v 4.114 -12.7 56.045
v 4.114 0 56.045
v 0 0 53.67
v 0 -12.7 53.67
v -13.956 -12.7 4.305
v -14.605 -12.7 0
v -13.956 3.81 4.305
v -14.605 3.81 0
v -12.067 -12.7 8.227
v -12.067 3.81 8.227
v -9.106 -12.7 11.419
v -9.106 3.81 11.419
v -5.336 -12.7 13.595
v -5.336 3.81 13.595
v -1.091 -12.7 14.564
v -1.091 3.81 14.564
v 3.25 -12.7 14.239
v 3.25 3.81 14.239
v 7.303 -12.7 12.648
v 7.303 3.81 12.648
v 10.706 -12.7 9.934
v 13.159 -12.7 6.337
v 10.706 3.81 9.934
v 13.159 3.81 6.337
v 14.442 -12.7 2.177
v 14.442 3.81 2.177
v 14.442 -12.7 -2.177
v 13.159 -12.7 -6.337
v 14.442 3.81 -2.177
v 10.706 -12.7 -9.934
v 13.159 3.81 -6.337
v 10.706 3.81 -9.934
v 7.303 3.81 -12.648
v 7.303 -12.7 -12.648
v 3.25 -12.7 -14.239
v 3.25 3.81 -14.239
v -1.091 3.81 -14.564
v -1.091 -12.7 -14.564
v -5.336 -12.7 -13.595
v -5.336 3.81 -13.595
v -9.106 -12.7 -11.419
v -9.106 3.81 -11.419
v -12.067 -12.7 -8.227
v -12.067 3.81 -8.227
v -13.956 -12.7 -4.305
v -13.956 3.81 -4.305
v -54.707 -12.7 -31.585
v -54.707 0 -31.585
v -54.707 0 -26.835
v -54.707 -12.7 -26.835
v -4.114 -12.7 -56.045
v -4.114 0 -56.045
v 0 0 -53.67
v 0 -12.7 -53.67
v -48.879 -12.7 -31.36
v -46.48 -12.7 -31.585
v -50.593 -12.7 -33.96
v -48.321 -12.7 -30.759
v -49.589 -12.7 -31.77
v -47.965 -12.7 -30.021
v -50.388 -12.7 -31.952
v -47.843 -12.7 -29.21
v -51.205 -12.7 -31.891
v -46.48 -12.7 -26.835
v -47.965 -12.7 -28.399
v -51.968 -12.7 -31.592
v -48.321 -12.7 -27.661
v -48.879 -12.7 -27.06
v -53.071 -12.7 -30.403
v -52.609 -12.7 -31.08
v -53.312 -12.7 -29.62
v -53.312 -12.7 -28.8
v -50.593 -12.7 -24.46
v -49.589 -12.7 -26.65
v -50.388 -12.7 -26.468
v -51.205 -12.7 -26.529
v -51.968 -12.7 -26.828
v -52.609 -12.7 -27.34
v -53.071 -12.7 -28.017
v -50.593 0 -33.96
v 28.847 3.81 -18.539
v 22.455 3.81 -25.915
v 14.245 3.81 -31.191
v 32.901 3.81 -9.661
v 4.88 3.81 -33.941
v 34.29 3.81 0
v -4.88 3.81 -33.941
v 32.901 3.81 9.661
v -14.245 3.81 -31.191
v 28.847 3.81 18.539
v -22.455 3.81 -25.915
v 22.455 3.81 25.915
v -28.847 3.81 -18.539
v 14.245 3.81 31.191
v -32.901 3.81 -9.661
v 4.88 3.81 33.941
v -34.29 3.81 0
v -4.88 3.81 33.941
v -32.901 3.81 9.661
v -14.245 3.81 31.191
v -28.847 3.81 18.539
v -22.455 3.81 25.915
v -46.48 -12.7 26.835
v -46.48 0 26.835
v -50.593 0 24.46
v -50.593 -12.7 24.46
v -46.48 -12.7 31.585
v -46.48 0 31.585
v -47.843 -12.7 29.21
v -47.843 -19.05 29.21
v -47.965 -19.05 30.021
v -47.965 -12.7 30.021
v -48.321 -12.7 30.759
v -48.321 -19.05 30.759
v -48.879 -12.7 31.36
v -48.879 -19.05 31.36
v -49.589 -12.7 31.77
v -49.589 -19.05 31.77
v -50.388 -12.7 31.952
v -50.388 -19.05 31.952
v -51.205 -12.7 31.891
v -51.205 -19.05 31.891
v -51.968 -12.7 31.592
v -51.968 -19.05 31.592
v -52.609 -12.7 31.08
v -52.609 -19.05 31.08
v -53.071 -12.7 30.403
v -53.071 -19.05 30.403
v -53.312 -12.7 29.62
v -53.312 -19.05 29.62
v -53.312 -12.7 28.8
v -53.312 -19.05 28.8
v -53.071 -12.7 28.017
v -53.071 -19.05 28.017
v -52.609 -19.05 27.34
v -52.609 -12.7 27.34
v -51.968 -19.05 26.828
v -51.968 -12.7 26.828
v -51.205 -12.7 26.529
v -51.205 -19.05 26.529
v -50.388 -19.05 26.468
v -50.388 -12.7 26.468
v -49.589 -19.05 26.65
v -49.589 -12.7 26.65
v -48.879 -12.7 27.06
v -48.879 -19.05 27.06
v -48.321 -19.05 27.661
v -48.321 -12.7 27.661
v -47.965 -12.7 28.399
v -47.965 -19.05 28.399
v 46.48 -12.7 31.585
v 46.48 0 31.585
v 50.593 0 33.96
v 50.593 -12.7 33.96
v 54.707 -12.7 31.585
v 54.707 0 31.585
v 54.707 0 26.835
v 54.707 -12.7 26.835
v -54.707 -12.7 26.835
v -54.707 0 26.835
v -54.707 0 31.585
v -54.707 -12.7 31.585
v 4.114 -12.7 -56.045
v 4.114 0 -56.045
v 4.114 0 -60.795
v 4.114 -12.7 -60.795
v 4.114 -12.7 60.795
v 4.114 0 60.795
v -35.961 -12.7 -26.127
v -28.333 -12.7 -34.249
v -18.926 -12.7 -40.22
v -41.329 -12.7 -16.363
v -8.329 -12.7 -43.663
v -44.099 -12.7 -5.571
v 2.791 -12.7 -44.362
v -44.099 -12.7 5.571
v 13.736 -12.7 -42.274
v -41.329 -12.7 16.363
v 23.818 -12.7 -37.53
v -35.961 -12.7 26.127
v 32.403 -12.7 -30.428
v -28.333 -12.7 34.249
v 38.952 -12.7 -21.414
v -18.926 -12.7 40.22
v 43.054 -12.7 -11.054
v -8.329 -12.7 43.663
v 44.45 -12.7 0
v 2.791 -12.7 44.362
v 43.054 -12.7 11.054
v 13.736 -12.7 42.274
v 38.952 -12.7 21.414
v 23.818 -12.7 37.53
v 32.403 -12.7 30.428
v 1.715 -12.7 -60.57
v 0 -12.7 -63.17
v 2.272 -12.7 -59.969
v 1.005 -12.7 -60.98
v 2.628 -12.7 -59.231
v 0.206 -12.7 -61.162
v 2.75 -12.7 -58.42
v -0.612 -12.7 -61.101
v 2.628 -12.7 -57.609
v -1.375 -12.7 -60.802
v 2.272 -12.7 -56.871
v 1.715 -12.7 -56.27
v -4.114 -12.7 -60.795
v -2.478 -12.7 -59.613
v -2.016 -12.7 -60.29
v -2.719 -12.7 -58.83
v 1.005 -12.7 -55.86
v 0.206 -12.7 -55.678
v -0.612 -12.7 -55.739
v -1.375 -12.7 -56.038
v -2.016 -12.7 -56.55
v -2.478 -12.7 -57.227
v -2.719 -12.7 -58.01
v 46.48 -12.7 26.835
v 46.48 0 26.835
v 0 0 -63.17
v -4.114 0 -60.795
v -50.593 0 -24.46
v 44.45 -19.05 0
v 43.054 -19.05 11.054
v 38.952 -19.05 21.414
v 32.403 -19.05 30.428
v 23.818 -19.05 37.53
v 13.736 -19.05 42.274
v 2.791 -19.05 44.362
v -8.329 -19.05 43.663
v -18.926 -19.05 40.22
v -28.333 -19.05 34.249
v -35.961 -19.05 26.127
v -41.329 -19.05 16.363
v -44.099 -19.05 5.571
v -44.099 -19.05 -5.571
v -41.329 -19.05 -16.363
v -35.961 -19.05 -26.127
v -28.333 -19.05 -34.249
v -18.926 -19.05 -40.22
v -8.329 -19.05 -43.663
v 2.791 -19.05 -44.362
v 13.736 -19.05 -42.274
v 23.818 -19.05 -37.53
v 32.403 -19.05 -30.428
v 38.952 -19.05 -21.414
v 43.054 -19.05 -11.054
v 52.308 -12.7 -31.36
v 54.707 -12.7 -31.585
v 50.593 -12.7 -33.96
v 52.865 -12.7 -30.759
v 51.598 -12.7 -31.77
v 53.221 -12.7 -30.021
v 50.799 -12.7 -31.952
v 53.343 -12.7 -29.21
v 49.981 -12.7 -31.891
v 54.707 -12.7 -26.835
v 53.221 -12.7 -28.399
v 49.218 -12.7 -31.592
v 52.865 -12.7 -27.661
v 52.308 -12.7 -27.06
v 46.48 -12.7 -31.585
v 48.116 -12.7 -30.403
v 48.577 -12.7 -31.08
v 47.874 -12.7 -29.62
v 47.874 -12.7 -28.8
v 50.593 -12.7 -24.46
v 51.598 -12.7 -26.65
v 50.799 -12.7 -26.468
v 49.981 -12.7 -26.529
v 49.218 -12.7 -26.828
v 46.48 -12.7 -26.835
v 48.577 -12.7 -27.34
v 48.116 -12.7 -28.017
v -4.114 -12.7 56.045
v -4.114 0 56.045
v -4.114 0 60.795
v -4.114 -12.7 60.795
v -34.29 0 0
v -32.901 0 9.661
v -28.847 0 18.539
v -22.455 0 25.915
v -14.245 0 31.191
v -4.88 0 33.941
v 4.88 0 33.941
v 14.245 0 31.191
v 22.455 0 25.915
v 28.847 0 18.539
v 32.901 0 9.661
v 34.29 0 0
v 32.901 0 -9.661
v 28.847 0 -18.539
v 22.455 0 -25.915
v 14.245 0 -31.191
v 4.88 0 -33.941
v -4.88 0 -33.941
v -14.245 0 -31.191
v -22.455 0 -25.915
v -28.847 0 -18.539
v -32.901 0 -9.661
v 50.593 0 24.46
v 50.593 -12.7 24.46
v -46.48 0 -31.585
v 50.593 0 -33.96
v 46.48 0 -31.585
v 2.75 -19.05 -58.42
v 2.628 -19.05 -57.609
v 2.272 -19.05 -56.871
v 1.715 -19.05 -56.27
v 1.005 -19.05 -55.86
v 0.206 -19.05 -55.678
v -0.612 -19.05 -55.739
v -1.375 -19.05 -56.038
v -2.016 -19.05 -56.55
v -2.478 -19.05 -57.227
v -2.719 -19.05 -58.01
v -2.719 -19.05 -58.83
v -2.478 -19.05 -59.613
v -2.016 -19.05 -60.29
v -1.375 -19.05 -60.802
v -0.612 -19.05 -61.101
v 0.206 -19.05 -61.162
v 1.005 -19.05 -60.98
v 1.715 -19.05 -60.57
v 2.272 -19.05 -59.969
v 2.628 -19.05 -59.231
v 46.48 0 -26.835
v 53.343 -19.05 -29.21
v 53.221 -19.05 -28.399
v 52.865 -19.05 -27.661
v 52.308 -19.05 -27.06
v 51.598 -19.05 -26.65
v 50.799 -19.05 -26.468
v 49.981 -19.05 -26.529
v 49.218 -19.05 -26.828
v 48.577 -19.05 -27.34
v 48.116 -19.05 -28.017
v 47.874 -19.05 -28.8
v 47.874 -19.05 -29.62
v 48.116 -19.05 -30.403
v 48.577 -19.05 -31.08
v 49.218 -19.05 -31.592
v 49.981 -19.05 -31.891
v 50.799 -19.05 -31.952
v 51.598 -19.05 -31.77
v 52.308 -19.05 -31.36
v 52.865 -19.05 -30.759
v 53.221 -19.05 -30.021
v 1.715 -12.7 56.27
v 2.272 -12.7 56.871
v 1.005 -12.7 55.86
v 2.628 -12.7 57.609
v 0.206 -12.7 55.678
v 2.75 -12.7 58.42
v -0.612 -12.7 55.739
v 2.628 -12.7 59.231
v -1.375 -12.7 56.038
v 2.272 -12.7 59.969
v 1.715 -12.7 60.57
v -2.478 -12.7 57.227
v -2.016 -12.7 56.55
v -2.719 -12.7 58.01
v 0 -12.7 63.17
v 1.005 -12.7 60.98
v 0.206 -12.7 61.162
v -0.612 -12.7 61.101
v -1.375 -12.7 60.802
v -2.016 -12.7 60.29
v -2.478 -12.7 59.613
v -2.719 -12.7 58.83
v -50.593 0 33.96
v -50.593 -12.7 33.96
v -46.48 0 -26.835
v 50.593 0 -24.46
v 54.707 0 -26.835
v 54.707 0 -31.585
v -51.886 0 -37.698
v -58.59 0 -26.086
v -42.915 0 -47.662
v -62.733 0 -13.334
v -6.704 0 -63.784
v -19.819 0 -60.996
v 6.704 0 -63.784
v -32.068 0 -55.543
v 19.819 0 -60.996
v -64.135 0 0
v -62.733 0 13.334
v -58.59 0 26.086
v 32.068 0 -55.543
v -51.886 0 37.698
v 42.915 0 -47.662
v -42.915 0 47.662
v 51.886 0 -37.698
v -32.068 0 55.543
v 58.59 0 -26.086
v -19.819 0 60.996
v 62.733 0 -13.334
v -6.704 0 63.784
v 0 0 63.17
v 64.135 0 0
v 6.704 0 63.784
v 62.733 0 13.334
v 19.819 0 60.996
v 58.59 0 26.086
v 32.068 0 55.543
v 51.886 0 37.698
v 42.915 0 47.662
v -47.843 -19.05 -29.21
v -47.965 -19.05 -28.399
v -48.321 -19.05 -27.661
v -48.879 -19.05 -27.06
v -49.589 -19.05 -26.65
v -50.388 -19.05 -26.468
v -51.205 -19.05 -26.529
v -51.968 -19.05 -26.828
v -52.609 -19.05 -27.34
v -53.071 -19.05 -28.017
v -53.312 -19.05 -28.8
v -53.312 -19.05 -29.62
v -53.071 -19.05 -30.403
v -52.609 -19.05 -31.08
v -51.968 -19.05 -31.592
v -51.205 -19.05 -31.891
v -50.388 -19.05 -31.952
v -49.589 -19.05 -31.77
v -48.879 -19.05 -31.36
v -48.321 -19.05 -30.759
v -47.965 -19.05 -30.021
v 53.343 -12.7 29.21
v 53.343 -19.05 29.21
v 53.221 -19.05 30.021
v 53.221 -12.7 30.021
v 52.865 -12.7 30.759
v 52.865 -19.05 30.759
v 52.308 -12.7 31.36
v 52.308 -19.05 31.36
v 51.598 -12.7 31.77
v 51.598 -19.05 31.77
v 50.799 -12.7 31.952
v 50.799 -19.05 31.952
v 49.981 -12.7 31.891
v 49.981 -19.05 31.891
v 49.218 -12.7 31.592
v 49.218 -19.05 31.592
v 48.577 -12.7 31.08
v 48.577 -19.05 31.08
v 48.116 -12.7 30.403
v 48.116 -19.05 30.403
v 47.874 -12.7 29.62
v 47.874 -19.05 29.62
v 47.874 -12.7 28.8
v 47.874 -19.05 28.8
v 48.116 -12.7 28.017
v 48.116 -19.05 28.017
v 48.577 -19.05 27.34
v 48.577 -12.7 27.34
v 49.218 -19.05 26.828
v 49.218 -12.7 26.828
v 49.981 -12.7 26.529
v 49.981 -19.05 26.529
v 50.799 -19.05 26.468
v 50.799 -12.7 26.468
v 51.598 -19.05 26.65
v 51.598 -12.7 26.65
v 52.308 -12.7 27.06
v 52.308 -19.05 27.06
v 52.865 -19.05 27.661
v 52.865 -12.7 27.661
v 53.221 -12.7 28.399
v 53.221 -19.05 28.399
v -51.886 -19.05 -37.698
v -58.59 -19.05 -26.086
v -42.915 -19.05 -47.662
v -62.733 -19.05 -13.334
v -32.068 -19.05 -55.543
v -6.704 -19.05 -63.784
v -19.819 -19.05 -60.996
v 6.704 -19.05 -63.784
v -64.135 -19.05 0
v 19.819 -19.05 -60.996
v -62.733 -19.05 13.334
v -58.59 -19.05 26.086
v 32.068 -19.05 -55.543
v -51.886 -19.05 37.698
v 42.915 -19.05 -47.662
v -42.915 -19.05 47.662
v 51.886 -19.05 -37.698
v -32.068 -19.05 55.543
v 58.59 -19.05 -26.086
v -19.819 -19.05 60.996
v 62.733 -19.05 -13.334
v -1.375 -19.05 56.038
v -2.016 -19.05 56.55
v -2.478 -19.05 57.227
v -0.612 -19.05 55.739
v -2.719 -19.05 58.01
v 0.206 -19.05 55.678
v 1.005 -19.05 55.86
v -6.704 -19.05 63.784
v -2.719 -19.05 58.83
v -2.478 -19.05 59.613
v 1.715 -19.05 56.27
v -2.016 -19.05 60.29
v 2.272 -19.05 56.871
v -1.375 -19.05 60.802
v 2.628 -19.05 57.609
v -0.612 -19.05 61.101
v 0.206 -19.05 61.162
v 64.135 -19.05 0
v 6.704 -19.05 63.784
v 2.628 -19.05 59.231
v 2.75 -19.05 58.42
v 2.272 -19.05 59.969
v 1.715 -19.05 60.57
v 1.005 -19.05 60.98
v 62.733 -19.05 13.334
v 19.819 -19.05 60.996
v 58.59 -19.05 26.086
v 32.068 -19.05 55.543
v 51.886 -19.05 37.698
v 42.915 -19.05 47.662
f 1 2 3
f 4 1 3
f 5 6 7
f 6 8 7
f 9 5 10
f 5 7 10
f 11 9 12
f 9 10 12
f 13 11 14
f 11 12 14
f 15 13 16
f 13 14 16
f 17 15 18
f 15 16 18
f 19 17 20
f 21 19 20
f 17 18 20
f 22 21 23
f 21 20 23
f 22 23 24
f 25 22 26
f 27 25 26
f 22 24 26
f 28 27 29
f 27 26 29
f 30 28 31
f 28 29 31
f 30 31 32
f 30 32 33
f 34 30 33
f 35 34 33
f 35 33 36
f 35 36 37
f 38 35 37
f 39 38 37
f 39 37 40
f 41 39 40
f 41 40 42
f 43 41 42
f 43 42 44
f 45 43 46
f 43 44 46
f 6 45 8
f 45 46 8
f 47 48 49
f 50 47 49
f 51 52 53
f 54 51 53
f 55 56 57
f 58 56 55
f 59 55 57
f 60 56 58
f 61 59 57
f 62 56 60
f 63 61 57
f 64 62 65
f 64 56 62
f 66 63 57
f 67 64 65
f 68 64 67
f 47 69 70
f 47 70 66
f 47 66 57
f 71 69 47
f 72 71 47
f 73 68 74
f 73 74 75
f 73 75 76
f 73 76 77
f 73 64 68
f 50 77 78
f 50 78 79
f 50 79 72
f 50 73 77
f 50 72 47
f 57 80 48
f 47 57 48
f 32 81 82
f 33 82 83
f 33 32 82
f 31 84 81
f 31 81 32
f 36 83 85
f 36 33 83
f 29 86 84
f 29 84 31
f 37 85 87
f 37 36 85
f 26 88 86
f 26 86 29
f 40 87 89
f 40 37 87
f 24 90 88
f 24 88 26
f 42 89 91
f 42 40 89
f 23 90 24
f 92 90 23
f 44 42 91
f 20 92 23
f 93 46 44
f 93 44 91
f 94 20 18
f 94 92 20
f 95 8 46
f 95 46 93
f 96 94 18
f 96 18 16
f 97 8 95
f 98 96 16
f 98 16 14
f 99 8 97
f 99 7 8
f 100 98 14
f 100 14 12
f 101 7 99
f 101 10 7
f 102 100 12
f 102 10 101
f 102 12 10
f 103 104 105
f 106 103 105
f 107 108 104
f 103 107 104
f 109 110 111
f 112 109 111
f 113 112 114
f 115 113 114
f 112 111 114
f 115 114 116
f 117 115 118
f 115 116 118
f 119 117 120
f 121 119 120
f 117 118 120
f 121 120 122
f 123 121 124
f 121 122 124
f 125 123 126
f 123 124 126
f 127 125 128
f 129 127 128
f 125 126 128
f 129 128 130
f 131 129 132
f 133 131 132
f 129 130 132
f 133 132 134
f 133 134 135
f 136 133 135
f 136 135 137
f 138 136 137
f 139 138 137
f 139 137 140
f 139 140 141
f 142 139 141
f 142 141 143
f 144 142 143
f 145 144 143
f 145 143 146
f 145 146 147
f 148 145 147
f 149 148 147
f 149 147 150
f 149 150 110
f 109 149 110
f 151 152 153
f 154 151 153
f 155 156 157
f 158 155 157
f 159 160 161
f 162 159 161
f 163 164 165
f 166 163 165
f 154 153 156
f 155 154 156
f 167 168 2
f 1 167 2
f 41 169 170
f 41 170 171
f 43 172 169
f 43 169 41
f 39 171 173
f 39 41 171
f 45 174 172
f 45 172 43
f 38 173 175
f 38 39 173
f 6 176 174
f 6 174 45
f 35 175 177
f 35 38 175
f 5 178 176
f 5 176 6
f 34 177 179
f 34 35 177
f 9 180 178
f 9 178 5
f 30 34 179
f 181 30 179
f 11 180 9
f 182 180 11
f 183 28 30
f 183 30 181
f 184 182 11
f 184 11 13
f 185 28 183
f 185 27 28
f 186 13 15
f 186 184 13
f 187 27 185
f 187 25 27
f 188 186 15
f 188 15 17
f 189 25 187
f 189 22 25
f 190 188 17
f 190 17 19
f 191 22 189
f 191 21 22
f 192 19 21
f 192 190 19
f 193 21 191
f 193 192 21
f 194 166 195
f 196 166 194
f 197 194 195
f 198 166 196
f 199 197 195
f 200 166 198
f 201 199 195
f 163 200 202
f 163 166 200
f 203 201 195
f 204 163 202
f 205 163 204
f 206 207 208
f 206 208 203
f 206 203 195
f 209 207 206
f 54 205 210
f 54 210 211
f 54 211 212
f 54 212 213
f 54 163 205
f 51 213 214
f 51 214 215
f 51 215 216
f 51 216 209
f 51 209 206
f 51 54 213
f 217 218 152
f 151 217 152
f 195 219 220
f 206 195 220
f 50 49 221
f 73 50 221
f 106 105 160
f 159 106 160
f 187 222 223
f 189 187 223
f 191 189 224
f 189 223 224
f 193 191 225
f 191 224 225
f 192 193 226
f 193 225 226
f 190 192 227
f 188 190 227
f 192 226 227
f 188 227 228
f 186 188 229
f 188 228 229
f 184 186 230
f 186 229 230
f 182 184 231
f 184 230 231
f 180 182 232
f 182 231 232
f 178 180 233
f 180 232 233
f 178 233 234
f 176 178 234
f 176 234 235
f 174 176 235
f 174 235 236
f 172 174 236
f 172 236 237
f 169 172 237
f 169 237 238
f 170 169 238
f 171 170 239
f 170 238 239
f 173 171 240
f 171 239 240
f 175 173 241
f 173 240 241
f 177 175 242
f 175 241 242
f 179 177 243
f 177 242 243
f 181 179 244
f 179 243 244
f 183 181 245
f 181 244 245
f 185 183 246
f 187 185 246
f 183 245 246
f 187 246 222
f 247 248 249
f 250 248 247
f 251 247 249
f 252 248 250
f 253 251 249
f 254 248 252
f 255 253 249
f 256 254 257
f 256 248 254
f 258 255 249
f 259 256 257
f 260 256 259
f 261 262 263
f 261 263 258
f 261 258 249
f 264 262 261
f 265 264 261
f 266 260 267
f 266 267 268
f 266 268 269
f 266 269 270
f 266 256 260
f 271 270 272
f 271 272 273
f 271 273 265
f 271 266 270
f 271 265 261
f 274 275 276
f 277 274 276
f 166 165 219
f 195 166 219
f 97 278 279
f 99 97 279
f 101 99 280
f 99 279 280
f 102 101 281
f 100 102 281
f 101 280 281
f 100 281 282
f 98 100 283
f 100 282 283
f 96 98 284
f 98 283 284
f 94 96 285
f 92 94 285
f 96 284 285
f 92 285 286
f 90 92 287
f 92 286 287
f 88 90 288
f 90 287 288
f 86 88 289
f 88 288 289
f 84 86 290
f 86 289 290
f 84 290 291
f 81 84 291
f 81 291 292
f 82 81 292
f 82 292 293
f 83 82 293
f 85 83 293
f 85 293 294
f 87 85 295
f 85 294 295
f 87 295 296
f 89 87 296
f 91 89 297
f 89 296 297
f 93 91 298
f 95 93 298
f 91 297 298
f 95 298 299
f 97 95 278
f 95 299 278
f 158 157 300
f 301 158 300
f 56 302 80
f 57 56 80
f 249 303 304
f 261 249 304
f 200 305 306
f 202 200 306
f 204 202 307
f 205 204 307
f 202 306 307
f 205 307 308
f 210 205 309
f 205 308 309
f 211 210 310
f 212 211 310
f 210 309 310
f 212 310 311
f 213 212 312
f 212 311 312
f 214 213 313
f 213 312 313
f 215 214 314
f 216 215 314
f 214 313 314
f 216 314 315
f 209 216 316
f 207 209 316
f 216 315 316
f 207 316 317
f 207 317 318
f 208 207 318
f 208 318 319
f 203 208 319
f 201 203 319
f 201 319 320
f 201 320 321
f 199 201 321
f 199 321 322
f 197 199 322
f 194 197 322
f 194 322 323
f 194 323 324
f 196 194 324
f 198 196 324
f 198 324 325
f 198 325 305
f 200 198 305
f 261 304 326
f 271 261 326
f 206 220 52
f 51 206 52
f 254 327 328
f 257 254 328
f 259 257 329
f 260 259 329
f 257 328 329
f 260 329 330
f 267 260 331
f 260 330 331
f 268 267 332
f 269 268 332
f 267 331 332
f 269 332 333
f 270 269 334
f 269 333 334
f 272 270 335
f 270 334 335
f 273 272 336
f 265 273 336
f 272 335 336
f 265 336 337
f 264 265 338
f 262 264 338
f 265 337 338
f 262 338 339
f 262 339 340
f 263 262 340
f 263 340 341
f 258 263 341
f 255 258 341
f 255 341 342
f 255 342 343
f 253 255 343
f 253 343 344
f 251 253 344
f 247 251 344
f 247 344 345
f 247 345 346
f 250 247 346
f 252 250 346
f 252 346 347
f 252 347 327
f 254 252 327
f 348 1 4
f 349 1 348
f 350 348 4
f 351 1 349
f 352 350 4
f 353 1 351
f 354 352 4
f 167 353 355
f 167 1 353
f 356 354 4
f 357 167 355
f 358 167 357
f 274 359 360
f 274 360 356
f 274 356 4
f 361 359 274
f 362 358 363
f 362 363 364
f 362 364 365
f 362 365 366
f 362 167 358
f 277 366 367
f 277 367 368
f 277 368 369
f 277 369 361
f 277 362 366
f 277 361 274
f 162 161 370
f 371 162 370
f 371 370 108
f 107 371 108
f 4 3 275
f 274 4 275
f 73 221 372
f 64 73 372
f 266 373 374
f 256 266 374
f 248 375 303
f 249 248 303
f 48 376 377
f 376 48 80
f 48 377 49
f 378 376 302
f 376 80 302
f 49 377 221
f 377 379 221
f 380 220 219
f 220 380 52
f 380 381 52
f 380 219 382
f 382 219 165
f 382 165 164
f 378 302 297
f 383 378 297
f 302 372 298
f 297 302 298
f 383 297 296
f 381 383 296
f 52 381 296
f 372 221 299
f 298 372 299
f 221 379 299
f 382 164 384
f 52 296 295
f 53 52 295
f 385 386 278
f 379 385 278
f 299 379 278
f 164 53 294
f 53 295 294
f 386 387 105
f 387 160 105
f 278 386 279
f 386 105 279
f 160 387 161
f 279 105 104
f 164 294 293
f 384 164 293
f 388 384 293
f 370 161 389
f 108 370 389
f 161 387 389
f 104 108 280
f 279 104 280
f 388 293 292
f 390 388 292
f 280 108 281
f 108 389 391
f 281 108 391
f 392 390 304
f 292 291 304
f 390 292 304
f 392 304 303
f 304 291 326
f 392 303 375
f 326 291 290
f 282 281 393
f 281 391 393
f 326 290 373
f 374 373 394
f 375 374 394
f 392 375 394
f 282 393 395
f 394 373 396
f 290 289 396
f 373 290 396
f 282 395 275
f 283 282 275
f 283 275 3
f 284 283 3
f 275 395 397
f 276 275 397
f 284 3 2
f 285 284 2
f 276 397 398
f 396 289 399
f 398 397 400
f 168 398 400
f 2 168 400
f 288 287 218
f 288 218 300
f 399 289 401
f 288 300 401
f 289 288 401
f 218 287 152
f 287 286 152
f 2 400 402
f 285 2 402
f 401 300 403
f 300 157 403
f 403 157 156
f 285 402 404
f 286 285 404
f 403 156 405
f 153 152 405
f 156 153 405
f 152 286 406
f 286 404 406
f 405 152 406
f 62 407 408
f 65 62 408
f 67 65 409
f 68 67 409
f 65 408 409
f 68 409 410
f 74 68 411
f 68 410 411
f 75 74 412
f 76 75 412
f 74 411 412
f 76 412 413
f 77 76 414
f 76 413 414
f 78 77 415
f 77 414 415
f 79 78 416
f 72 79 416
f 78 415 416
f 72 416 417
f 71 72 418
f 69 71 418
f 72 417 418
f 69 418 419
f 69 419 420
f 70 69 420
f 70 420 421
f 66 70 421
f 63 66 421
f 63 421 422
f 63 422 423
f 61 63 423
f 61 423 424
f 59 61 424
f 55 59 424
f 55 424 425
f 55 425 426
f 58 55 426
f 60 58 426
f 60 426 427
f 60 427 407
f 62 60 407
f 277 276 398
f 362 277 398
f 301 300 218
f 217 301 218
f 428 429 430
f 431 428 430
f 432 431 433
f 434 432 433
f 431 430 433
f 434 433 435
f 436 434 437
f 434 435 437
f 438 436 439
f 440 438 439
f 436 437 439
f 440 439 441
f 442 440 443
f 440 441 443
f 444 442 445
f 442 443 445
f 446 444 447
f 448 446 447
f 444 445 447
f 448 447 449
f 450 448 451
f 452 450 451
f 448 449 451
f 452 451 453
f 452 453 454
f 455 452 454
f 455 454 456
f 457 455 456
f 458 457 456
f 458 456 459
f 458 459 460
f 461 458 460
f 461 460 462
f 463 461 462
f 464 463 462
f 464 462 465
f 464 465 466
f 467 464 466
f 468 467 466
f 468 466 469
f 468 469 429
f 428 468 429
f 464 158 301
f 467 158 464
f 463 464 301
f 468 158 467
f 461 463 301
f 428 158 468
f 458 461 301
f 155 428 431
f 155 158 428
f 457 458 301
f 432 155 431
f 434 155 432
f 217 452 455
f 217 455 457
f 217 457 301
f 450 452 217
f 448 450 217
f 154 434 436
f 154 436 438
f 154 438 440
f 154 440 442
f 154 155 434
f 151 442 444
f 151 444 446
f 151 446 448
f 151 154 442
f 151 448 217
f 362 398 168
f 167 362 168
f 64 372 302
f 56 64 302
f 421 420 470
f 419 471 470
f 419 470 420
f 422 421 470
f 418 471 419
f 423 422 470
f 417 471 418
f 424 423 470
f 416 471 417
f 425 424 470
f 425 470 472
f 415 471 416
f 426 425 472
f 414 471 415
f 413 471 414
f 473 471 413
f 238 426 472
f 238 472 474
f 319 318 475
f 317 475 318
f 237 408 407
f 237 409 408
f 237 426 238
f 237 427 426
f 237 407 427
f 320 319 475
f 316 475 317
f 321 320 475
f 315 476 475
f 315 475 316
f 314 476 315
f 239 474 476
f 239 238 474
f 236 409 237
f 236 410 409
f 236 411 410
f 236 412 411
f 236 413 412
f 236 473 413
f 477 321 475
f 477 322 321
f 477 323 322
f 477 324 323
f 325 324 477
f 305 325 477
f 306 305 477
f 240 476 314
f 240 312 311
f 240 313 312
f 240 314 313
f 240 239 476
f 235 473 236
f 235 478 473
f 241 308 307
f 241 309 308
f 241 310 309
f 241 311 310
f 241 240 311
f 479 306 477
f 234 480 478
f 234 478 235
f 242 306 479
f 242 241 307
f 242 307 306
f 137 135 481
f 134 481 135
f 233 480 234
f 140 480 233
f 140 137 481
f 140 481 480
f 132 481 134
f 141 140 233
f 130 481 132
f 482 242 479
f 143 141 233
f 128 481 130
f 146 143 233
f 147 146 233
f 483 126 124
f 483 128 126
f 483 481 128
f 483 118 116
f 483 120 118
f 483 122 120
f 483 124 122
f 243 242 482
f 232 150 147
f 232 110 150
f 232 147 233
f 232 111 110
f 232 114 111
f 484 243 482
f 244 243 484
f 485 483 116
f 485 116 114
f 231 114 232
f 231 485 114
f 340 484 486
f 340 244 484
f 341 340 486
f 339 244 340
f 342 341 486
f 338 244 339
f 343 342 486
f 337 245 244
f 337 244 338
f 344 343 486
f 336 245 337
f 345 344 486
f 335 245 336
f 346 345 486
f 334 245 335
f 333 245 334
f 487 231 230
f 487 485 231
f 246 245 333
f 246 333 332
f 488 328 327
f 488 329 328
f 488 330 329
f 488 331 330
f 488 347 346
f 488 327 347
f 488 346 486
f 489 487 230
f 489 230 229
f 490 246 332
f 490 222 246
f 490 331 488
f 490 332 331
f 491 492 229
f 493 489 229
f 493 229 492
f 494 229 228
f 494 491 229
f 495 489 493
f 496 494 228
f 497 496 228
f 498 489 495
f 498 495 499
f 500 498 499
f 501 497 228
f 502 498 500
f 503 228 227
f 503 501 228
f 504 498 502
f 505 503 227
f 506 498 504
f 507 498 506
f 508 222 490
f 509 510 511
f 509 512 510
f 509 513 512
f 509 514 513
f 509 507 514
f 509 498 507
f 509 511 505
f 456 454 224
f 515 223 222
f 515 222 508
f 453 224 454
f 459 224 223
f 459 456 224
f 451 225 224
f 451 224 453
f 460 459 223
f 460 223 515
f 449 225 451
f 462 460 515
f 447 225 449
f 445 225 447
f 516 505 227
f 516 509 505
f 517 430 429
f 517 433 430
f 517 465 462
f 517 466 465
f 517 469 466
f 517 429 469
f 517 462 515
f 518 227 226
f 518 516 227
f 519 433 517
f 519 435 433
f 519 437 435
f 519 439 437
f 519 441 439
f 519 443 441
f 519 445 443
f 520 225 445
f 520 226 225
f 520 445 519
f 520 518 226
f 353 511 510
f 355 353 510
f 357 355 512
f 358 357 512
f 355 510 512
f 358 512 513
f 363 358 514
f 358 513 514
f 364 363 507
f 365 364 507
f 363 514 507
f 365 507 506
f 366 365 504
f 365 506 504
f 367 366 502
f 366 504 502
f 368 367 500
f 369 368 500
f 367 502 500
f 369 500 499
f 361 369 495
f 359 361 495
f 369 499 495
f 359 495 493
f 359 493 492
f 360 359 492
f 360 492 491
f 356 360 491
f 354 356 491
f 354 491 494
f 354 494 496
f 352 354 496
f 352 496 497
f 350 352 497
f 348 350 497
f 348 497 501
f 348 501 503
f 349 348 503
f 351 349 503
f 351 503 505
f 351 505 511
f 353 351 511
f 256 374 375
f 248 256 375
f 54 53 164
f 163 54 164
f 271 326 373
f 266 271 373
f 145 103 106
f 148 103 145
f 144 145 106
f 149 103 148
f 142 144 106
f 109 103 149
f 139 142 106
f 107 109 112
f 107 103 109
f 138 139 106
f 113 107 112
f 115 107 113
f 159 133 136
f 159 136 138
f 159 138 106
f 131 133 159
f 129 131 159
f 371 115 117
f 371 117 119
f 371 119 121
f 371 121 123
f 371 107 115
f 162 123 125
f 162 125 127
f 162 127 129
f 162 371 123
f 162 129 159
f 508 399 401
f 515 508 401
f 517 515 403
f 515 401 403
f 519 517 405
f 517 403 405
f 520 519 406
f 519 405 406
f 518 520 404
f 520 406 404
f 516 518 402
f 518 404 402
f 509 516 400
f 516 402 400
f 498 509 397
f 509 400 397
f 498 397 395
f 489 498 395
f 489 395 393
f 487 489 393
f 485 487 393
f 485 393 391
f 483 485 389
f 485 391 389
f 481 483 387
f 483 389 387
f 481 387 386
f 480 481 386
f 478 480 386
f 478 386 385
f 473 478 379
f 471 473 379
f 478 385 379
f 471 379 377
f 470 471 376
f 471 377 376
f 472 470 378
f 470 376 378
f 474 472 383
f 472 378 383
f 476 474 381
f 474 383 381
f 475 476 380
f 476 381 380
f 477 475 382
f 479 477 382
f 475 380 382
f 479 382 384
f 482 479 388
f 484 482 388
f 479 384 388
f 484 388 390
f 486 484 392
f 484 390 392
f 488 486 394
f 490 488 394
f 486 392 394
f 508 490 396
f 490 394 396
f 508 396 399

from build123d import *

# Parameters (mm, degrees)
F0_R          = 64.135
F1_DEPTH      = 19.05
F3_R          = 34.29
F4_DEPTH      = 3.81
F5_R          = 12.7
F6_DEPTH      = 22.861
F2_R          = 14.605
F8_DEPTH      = 19.051
F8_DEPTH_BACK = 3.811
F7_R          = 44.45
F9_DEPTH      = 6.35
F12_DEPTH     = 12.7
F13_D         = 5.5


with BuildPart() as f1:
    # F0 (on Front) → F1 (new body)
    with BuildSketch(Plane.XZ):
        Circle(F0_R)
    extrude(amount=F1_DEPTH)

    # F3 (on face) → F4 (join)
    with BuildSketch(Plane(origin=(0, 0, 0), x_dir=(-1, 0, 0), z_dir=(0, 1, 0))):
        Circle(F3_R)
    extrude(amount=F4_DEPTH)

    # F5 (on face) → F6 (cut, through all)
    with BuildSketch(Plane.XZ.offset(19.05)):
        Circle(F5_R)
    extrude(amount=-F6_DEPTH, mode=Mode.SUBTRACT)

    # F2 (on face) → F8 (cut, two sides)
    with BuildSketch(Plane(origin=(0, 0, 0), x_dir=(-1, 0, 0), z_dir=(0, 1, 0))) as f8_sk:
        Circle(F2_R)
    extrude(amount=-F8_DEPTH, mode=Mode.SUBTRACT)
    extrude(f8_sk.sketch, amount=F8_DEPTH_BACK, mode=Mode.SUBTRACT)

    # F7 (on face) → F9 (cut)
    with BuildSketch(Plane.XZ.offset(19.05)):
        Circle(F7_R)
    extrude(amount=-F9_DEPTH, mode=Mode.SUBTRACT)

    # F11 (on face) → F12 (cut)
    with BuildSketch(Plane(origin=(0, 0, 0), x_dir=(-1, 0, 0), z_dir=(0, 1, 0))):
        Polygon((4.113620668, -60.795), (4.113620668, -56.045), (0, -53.67), (-4.113620668, -56.045), (-4.113620668, -60.795), (0, -63.17), align=None)
        Polygon((46.4795834211, -26.835), (46.4795834211, -31.585), (50.5932040891, -33.96), (54.7068247571, -31.585), (54.7068247571, -26.835), (50.5932040891, -24.46), align=None)
        Polygon((46.4795834211, 26.835), (50.5932040891, 24.46), (54.7068247571, 26.835), (54.7068247571, 31.585), (50.5932040891, 33.96), (46.4795834211, 31.585), align=None)
        Polygon((0, 53.67), (4.113620668, 56.045), (4.113620668, 60.795), (0, 63.17), (-4.113620668, 60.795), (-4.113620668, 56.045), align=None)
        Polygon((-46.4795834211, 26.835), (-46.4795834211, 31.585), (-50.5932040891, 33.96), (-54.7068247571, 31.585), (-54.7068247571, 26.835), (-50.5932040891, 24.46), align=None)
        Polygon((-46.4795834211, -26.835), (-50.5932040891, -24.46), (-54.7068247571, -26.835), (-54.7068247571, -31.585), (-50.5932040891, -33.96), (-46.4795834211, -31.585), align=None)
    extrude(amount=-F12_DEPTH, mode=Mode.SUBTRACT)

    # F13 (through all)
    with Locations(Plane(origin=(0, 0, 0), x_dir=(-1, 0, 0), z_dir=(0, 1, 0))):
        with Locations((50.5932040891, 29.21), (50.5932040891, -29.21), (0, -58.42), (-50.5932040891, -29.21), (-50.5932040891, 29.21), (0, 58.42)):
            Hole(F13_D / 2)


solid = f1.part
